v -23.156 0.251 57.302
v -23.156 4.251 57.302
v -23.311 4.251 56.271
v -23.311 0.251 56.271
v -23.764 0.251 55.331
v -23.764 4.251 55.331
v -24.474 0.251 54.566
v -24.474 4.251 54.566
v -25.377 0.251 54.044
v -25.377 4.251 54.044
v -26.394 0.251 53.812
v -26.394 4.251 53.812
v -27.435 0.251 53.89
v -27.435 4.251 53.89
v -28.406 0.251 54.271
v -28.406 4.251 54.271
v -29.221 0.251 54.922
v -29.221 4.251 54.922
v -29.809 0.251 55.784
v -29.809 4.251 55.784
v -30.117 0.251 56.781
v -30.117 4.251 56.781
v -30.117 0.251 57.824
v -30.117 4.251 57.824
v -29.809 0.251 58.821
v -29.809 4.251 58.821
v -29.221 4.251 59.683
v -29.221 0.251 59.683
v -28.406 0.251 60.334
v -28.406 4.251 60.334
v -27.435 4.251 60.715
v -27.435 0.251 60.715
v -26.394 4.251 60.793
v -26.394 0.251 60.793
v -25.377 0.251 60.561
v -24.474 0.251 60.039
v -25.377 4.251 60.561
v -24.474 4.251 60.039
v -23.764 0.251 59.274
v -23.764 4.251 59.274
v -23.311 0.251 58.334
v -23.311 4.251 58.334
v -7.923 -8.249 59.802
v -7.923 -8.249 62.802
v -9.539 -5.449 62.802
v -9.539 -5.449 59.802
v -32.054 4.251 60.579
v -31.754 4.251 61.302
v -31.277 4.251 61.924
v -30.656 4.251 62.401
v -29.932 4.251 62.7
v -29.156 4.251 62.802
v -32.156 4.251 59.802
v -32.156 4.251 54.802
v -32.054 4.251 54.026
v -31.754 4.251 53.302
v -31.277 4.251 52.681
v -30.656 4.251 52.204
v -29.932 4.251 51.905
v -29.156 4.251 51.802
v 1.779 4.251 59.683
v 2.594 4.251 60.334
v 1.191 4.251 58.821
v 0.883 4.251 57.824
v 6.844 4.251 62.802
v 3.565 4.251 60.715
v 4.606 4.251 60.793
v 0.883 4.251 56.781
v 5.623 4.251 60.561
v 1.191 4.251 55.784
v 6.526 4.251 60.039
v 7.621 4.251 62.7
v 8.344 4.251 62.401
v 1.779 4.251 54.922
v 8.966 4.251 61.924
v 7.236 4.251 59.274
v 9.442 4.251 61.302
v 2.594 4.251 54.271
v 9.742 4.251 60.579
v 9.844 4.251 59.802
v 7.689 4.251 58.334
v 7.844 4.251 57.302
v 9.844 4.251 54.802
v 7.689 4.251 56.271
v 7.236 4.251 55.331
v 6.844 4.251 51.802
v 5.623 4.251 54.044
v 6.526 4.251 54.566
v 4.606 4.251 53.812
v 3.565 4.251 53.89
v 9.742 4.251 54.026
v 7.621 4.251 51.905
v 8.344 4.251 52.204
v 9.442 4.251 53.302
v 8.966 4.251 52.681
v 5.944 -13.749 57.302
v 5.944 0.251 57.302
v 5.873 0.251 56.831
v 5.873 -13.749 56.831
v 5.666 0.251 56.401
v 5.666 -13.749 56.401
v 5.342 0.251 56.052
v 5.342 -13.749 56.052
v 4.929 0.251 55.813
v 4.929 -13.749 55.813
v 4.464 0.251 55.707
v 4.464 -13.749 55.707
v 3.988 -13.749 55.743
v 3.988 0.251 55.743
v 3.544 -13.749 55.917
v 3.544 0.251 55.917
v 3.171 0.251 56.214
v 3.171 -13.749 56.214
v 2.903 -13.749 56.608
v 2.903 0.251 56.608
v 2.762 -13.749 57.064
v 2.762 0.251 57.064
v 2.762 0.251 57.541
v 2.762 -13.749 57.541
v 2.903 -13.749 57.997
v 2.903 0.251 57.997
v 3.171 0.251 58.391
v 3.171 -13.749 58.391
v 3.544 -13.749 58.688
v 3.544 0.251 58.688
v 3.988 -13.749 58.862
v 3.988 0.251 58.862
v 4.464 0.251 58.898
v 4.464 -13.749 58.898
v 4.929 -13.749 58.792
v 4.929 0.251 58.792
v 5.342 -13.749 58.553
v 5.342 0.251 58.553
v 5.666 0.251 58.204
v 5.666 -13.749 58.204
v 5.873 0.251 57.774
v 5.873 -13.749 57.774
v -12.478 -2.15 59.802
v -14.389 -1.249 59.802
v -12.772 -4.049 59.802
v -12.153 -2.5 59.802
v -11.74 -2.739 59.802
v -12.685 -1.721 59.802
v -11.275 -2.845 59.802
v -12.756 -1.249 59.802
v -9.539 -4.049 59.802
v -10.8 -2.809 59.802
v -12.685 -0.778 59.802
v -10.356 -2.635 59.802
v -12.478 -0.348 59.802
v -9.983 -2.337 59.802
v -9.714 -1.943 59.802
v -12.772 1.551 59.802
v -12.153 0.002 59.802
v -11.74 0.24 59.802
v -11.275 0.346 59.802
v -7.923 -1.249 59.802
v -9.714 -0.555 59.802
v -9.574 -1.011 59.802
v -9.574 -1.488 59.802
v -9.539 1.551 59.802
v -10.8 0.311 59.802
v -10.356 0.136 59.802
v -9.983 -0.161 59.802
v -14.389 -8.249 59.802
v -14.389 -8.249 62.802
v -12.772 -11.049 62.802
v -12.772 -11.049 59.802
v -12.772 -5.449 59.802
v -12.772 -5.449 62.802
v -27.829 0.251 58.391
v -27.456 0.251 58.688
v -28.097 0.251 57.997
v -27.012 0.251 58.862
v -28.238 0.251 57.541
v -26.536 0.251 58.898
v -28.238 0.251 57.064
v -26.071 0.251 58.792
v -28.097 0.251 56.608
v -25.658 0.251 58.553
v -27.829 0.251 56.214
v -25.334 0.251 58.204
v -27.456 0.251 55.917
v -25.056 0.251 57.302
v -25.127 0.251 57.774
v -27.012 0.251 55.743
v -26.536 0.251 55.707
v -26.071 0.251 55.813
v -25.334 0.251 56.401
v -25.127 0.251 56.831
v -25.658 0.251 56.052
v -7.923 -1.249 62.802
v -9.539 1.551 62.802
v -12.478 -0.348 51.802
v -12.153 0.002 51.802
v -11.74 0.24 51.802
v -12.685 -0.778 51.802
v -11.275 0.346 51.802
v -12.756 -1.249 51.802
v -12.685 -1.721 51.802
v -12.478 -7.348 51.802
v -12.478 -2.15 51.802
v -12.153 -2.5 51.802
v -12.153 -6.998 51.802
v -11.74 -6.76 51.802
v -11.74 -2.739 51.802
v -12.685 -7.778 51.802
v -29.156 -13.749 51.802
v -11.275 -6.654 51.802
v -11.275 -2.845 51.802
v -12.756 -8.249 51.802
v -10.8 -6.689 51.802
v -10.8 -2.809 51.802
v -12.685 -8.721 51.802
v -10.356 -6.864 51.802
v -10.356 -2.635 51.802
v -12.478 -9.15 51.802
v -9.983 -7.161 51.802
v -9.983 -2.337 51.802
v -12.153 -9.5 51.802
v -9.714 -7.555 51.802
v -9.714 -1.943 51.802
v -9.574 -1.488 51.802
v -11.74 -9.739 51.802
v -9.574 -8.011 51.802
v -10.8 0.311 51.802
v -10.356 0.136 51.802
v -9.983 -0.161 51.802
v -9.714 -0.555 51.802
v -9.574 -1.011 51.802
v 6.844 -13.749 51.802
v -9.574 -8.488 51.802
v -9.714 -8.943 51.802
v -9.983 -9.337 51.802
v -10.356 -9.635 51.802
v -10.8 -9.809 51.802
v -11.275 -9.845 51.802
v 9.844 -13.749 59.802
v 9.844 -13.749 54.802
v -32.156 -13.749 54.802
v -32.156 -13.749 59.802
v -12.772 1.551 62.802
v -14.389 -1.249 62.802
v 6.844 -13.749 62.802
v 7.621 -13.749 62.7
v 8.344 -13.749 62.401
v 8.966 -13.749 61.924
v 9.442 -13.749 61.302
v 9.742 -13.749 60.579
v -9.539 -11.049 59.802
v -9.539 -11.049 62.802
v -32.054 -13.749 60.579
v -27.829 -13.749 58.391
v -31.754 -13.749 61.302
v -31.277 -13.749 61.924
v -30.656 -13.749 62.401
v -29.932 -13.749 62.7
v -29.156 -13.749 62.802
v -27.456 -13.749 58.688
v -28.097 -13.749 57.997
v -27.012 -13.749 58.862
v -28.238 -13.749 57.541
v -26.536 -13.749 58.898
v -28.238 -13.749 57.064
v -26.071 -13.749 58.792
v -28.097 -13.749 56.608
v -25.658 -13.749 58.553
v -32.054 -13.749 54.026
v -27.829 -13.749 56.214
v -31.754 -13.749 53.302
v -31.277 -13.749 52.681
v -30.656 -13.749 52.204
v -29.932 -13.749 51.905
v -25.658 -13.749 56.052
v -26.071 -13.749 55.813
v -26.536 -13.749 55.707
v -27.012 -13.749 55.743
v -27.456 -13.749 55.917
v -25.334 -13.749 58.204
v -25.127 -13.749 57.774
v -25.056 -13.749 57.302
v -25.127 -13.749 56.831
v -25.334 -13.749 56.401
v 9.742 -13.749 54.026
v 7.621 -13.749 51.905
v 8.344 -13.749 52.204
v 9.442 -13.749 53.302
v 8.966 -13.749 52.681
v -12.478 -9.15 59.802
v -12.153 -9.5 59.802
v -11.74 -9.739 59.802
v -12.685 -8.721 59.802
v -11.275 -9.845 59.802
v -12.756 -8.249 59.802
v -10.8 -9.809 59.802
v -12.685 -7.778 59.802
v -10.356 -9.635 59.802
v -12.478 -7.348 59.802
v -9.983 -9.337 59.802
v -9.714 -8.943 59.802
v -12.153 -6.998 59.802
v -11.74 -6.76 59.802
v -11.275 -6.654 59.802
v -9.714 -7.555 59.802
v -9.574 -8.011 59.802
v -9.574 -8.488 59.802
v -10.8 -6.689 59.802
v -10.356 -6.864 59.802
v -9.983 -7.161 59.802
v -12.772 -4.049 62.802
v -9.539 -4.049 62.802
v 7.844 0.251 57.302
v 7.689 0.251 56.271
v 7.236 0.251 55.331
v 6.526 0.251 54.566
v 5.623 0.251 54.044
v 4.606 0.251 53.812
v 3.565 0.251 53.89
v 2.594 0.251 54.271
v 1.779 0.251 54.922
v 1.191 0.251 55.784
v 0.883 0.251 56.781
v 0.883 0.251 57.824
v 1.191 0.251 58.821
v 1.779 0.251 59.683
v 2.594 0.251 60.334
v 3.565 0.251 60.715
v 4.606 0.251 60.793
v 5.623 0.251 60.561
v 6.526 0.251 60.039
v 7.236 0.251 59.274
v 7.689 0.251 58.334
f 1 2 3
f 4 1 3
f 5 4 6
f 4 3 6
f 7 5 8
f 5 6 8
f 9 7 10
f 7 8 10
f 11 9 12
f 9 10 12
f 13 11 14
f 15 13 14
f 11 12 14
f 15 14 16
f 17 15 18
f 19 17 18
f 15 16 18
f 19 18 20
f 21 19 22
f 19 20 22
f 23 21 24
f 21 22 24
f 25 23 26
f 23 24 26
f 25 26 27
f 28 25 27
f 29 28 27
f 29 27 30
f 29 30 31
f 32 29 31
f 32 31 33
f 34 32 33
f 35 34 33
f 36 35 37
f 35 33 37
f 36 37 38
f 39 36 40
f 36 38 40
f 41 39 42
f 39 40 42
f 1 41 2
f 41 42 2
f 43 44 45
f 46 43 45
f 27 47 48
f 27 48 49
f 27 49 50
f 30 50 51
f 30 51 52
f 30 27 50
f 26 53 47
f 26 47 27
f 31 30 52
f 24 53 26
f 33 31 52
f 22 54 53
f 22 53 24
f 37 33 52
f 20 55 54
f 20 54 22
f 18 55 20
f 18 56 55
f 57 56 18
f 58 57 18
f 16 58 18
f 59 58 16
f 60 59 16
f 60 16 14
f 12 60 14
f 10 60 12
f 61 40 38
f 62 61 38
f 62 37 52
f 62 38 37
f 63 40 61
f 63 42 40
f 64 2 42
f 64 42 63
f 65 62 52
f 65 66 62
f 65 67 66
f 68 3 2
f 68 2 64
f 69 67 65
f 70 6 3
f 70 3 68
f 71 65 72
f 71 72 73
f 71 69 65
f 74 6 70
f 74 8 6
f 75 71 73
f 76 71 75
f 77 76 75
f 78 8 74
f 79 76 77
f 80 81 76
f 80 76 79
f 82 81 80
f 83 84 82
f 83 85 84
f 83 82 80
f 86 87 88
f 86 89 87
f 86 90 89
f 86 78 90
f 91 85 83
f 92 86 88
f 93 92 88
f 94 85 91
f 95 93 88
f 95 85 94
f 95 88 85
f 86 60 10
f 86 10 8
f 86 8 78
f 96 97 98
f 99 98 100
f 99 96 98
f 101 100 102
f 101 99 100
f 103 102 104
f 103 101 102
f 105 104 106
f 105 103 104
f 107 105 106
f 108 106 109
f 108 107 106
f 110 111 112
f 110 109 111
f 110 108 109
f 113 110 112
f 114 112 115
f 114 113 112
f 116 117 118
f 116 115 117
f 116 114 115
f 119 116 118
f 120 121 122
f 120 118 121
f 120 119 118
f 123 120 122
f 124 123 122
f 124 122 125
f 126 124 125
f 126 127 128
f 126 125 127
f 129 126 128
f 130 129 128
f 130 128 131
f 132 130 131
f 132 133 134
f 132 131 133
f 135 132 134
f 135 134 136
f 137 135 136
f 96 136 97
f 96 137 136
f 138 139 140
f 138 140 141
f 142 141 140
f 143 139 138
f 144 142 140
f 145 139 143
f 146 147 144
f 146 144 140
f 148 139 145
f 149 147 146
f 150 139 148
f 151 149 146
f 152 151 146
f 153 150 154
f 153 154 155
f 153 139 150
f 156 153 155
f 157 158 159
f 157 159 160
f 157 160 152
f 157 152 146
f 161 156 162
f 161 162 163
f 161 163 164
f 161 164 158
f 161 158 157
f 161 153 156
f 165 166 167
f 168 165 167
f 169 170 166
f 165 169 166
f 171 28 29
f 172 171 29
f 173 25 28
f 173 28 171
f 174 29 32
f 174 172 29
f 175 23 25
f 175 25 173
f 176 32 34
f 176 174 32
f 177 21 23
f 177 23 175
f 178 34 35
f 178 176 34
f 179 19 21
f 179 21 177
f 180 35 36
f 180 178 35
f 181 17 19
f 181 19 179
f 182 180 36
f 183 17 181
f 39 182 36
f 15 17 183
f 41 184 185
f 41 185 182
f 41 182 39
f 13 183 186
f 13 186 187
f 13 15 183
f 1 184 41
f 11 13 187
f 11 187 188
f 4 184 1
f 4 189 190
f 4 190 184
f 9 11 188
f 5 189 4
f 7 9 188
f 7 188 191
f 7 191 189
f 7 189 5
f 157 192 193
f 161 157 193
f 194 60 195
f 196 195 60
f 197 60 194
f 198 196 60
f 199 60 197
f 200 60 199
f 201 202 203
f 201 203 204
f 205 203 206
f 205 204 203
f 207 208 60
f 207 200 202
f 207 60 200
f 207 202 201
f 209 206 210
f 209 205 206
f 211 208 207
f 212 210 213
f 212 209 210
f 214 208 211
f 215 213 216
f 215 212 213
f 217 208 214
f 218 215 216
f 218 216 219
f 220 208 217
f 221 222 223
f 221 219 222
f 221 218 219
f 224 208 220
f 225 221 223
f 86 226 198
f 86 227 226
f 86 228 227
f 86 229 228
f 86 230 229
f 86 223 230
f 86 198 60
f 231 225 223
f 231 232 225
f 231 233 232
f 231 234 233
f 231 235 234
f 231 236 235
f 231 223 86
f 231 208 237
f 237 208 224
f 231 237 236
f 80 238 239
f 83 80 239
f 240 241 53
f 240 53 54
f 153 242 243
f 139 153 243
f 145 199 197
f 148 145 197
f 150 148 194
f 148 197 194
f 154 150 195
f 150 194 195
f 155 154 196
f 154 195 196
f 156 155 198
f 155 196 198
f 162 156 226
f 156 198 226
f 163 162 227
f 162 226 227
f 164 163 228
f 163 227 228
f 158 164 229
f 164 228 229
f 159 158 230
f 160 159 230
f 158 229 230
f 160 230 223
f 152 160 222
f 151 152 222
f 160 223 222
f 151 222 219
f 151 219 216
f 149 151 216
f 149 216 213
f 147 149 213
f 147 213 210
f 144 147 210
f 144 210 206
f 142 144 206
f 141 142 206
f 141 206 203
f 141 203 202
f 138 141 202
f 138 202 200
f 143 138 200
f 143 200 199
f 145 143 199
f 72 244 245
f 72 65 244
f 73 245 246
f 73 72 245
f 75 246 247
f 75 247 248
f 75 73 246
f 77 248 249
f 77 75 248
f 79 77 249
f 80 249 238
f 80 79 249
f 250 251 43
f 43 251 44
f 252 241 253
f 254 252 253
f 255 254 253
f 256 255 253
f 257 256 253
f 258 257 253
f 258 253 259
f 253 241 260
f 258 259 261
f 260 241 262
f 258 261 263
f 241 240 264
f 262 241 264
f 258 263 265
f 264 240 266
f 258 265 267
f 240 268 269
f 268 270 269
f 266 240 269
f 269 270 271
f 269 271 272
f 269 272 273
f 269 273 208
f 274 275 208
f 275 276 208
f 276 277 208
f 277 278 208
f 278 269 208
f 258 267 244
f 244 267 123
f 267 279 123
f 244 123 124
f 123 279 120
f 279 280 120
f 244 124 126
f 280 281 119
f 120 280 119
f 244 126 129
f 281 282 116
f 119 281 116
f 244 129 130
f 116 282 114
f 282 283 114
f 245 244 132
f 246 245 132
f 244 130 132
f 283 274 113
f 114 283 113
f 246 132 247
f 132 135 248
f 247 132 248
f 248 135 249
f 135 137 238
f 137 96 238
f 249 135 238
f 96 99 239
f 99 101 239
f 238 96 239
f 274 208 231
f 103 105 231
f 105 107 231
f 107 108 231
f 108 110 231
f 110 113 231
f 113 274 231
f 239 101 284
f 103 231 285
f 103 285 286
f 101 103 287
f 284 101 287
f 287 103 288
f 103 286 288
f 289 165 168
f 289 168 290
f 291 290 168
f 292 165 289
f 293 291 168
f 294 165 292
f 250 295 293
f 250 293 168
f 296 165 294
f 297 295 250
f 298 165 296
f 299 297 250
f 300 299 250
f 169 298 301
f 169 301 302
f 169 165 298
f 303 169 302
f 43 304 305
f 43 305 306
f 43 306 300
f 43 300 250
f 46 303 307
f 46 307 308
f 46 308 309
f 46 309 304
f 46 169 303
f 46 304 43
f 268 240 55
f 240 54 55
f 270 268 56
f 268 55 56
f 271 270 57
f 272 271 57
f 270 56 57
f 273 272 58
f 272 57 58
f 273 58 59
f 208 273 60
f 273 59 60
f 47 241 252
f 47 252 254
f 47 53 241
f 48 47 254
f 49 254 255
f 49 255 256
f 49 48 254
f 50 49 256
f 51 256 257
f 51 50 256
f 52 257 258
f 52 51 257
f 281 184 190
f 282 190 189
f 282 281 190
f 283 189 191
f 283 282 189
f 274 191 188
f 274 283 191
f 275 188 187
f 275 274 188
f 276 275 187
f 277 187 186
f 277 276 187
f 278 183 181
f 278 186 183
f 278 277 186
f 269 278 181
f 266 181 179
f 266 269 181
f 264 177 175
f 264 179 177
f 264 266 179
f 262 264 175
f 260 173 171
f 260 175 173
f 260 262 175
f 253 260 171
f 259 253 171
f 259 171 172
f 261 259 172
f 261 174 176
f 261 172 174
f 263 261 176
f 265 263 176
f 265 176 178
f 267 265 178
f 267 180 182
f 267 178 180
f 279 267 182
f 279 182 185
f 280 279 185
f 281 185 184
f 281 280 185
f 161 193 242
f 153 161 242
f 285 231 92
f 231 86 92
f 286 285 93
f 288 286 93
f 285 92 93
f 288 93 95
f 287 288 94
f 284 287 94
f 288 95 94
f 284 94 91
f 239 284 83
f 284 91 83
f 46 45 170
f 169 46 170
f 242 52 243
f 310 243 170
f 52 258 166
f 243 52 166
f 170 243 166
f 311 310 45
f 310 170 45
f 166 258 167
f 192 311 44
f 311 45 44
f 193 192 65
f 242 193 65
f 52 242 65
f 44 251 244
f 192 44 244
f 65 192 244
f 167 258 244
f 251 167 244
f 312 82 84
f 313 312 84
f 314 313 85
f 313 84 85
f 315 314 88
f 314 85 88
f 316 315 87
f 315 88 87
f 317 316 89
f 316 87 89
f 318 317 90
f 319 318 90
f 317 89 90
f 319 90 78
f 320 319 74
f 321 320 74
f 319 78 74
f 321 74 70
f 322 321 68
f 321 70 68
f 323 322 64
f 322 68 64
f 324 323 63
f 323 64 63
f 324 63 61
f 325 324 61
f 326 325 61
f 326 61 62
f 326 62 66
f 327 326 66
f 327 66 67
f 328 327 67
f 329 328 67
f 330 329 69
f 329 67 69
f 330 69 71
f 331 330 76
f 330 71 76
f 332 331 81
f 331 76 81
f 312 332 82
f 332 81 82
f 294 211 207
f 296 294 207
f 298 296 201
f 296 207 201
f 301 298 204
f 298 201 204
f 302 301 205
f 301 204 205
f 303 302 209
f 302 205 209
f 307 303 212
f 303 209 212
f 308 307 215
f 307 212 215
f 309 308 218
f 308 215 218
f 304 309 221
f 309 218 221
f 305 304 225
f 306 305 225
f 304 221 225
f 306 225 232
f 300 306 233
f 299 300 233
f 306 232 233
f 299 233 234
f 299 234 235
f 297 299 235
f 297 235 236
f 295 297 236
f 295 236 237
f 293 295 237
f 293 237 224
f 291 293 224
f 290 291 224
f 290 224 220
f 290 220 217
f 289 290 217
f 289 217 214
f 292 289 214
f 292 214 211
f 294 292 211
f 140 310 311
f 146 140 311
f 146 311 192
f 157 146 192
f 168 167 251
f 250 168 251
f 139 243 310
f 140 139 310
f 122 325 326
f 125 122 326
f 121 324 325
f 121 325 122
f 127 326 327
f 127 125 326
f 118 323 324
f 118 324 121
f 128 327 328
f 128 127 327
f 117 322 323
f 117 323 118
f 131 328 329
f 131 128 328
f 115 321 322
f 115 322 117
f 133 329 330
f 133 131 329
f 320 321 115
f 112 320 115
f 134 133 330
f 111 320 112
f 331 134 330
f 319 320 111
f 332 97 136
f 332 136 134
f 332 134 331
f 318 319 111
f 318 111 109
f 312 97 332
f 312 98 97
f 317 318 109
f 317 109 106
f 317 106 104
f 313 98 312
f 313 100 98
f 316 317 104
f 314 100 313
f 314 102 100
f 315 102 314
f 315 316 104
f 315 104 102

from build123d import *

# Parameters (mm, degrees)
SKETCH_1_W          = 42
SKETCH_1_H          = 11
SKETCH_1_R          = 1.6
EXTRUDE_1_DEPTH     = 18
FILLET_1_R          = 3
SKETCH_3_R          = 3.5
CUT_EXTRUDE_2_DEPTH = 4
SKETCH_4_R          = 1.6
CUT_EXTRUDE_3_DEPTH = 11
CUT_EXTRUDE_4_DEPTH = 3


with BuildPart() as part:
    # 스케치1 → 보스-돌출1 (new body)
    with BuildSketch(Plane(origin=(0, -13.749164409, 0), x_dir=(1, 0, 0), z_dir=(0, 1, 0))):
        with Locations((-11.155757596, -57.302460642)):
            Rectangle(SKETCH_1_W, SKETCH_1_H)
        with Locations((-26.655757596, -57.302460642)):
            Circle(SKETCH_1_R, mode=Mode.SUBTRACT)
        with Locations((4.344242404, -57.302460642)):
            Circle(SKETCH_1_R, mode=Mode.SUBTRACT)
    extrude(amount=EXTRUDE_1_DEPTH)

    # 필렛1
    fillet_1_edges = [part.edges().sort_by_distance(p)[0] for p in [
        (-32.155757596, -4.749164409, 51.802460642),
        (9.844242404, -4.749164409, 51.802460642),
        (9.844242404, -4.749164409, 62.802460642),
        (-32.155757596, -4.749164409, 62.802460642),
    ]]
    fillet(fillet_1_edges, radius=FILLET_1_R)

    # 스케치3 → 컷-돌출2 (cut)
    with BuildSketch(Plane(origin=(0, 4.250835591, 0), x_dir=(1, 0, 0), z_dir=(0, 1, 0))):
        with Locations((-26.655757596, -57.302460642)):
            Circle(SKETCH_3_R)
        with Locations((4.344242404, -57.302460642)):
            Circle(SKETCH_3_R)
    extrude(amount=-CUT_EXTRUDE_2_DEPTH, mode=Mode.SUBTRACT)

    # 스케치4 → 컷-돌출3 (cut)
    with BuildSketch(Plane(origin=(0, 0, 51.802460642), x_dir=(-1, 0, 0), z_dir=(0, 0, -1))):
        with Locations((11.155757596, -1.249164409)):
            Circle(SKETCH_4_R)
        with Locations((11.155757596, -8.249164409)):
            Circle(SKETCH_4_R)
    extrude(amount=-CUT_EXTRUDE_3_DEPTH, mode=Mode.SUBTRACT)

    # 스케치6 → 컷-돌출4 (cut)
    with BuildSketch(Plane.XY.offset(62.802460642)):
        Polygon((-7.922596089, -1.249164409), (-9.539176842, 1.550835591), (-12.77233835, 1.550835591), (-14.388919104, -1.249164409), (-12.77233835, -4.049164409), (-9.539176842, -4.049164409), align=None)
        Polygon((-7.922596089, -8.249164409), (-9.539176842, -5.449164409), (-12.77233835, -5.449164409), (-14.388919104, -8.249164409), (-12.77233835, -11.049164409), (-9.539176842, -11.049164409), align=None)
    extrude(amount=-CUT_EXTRUDE_4_DEPTH, mode=Mode.SUBTRACT)


solid = part.part
